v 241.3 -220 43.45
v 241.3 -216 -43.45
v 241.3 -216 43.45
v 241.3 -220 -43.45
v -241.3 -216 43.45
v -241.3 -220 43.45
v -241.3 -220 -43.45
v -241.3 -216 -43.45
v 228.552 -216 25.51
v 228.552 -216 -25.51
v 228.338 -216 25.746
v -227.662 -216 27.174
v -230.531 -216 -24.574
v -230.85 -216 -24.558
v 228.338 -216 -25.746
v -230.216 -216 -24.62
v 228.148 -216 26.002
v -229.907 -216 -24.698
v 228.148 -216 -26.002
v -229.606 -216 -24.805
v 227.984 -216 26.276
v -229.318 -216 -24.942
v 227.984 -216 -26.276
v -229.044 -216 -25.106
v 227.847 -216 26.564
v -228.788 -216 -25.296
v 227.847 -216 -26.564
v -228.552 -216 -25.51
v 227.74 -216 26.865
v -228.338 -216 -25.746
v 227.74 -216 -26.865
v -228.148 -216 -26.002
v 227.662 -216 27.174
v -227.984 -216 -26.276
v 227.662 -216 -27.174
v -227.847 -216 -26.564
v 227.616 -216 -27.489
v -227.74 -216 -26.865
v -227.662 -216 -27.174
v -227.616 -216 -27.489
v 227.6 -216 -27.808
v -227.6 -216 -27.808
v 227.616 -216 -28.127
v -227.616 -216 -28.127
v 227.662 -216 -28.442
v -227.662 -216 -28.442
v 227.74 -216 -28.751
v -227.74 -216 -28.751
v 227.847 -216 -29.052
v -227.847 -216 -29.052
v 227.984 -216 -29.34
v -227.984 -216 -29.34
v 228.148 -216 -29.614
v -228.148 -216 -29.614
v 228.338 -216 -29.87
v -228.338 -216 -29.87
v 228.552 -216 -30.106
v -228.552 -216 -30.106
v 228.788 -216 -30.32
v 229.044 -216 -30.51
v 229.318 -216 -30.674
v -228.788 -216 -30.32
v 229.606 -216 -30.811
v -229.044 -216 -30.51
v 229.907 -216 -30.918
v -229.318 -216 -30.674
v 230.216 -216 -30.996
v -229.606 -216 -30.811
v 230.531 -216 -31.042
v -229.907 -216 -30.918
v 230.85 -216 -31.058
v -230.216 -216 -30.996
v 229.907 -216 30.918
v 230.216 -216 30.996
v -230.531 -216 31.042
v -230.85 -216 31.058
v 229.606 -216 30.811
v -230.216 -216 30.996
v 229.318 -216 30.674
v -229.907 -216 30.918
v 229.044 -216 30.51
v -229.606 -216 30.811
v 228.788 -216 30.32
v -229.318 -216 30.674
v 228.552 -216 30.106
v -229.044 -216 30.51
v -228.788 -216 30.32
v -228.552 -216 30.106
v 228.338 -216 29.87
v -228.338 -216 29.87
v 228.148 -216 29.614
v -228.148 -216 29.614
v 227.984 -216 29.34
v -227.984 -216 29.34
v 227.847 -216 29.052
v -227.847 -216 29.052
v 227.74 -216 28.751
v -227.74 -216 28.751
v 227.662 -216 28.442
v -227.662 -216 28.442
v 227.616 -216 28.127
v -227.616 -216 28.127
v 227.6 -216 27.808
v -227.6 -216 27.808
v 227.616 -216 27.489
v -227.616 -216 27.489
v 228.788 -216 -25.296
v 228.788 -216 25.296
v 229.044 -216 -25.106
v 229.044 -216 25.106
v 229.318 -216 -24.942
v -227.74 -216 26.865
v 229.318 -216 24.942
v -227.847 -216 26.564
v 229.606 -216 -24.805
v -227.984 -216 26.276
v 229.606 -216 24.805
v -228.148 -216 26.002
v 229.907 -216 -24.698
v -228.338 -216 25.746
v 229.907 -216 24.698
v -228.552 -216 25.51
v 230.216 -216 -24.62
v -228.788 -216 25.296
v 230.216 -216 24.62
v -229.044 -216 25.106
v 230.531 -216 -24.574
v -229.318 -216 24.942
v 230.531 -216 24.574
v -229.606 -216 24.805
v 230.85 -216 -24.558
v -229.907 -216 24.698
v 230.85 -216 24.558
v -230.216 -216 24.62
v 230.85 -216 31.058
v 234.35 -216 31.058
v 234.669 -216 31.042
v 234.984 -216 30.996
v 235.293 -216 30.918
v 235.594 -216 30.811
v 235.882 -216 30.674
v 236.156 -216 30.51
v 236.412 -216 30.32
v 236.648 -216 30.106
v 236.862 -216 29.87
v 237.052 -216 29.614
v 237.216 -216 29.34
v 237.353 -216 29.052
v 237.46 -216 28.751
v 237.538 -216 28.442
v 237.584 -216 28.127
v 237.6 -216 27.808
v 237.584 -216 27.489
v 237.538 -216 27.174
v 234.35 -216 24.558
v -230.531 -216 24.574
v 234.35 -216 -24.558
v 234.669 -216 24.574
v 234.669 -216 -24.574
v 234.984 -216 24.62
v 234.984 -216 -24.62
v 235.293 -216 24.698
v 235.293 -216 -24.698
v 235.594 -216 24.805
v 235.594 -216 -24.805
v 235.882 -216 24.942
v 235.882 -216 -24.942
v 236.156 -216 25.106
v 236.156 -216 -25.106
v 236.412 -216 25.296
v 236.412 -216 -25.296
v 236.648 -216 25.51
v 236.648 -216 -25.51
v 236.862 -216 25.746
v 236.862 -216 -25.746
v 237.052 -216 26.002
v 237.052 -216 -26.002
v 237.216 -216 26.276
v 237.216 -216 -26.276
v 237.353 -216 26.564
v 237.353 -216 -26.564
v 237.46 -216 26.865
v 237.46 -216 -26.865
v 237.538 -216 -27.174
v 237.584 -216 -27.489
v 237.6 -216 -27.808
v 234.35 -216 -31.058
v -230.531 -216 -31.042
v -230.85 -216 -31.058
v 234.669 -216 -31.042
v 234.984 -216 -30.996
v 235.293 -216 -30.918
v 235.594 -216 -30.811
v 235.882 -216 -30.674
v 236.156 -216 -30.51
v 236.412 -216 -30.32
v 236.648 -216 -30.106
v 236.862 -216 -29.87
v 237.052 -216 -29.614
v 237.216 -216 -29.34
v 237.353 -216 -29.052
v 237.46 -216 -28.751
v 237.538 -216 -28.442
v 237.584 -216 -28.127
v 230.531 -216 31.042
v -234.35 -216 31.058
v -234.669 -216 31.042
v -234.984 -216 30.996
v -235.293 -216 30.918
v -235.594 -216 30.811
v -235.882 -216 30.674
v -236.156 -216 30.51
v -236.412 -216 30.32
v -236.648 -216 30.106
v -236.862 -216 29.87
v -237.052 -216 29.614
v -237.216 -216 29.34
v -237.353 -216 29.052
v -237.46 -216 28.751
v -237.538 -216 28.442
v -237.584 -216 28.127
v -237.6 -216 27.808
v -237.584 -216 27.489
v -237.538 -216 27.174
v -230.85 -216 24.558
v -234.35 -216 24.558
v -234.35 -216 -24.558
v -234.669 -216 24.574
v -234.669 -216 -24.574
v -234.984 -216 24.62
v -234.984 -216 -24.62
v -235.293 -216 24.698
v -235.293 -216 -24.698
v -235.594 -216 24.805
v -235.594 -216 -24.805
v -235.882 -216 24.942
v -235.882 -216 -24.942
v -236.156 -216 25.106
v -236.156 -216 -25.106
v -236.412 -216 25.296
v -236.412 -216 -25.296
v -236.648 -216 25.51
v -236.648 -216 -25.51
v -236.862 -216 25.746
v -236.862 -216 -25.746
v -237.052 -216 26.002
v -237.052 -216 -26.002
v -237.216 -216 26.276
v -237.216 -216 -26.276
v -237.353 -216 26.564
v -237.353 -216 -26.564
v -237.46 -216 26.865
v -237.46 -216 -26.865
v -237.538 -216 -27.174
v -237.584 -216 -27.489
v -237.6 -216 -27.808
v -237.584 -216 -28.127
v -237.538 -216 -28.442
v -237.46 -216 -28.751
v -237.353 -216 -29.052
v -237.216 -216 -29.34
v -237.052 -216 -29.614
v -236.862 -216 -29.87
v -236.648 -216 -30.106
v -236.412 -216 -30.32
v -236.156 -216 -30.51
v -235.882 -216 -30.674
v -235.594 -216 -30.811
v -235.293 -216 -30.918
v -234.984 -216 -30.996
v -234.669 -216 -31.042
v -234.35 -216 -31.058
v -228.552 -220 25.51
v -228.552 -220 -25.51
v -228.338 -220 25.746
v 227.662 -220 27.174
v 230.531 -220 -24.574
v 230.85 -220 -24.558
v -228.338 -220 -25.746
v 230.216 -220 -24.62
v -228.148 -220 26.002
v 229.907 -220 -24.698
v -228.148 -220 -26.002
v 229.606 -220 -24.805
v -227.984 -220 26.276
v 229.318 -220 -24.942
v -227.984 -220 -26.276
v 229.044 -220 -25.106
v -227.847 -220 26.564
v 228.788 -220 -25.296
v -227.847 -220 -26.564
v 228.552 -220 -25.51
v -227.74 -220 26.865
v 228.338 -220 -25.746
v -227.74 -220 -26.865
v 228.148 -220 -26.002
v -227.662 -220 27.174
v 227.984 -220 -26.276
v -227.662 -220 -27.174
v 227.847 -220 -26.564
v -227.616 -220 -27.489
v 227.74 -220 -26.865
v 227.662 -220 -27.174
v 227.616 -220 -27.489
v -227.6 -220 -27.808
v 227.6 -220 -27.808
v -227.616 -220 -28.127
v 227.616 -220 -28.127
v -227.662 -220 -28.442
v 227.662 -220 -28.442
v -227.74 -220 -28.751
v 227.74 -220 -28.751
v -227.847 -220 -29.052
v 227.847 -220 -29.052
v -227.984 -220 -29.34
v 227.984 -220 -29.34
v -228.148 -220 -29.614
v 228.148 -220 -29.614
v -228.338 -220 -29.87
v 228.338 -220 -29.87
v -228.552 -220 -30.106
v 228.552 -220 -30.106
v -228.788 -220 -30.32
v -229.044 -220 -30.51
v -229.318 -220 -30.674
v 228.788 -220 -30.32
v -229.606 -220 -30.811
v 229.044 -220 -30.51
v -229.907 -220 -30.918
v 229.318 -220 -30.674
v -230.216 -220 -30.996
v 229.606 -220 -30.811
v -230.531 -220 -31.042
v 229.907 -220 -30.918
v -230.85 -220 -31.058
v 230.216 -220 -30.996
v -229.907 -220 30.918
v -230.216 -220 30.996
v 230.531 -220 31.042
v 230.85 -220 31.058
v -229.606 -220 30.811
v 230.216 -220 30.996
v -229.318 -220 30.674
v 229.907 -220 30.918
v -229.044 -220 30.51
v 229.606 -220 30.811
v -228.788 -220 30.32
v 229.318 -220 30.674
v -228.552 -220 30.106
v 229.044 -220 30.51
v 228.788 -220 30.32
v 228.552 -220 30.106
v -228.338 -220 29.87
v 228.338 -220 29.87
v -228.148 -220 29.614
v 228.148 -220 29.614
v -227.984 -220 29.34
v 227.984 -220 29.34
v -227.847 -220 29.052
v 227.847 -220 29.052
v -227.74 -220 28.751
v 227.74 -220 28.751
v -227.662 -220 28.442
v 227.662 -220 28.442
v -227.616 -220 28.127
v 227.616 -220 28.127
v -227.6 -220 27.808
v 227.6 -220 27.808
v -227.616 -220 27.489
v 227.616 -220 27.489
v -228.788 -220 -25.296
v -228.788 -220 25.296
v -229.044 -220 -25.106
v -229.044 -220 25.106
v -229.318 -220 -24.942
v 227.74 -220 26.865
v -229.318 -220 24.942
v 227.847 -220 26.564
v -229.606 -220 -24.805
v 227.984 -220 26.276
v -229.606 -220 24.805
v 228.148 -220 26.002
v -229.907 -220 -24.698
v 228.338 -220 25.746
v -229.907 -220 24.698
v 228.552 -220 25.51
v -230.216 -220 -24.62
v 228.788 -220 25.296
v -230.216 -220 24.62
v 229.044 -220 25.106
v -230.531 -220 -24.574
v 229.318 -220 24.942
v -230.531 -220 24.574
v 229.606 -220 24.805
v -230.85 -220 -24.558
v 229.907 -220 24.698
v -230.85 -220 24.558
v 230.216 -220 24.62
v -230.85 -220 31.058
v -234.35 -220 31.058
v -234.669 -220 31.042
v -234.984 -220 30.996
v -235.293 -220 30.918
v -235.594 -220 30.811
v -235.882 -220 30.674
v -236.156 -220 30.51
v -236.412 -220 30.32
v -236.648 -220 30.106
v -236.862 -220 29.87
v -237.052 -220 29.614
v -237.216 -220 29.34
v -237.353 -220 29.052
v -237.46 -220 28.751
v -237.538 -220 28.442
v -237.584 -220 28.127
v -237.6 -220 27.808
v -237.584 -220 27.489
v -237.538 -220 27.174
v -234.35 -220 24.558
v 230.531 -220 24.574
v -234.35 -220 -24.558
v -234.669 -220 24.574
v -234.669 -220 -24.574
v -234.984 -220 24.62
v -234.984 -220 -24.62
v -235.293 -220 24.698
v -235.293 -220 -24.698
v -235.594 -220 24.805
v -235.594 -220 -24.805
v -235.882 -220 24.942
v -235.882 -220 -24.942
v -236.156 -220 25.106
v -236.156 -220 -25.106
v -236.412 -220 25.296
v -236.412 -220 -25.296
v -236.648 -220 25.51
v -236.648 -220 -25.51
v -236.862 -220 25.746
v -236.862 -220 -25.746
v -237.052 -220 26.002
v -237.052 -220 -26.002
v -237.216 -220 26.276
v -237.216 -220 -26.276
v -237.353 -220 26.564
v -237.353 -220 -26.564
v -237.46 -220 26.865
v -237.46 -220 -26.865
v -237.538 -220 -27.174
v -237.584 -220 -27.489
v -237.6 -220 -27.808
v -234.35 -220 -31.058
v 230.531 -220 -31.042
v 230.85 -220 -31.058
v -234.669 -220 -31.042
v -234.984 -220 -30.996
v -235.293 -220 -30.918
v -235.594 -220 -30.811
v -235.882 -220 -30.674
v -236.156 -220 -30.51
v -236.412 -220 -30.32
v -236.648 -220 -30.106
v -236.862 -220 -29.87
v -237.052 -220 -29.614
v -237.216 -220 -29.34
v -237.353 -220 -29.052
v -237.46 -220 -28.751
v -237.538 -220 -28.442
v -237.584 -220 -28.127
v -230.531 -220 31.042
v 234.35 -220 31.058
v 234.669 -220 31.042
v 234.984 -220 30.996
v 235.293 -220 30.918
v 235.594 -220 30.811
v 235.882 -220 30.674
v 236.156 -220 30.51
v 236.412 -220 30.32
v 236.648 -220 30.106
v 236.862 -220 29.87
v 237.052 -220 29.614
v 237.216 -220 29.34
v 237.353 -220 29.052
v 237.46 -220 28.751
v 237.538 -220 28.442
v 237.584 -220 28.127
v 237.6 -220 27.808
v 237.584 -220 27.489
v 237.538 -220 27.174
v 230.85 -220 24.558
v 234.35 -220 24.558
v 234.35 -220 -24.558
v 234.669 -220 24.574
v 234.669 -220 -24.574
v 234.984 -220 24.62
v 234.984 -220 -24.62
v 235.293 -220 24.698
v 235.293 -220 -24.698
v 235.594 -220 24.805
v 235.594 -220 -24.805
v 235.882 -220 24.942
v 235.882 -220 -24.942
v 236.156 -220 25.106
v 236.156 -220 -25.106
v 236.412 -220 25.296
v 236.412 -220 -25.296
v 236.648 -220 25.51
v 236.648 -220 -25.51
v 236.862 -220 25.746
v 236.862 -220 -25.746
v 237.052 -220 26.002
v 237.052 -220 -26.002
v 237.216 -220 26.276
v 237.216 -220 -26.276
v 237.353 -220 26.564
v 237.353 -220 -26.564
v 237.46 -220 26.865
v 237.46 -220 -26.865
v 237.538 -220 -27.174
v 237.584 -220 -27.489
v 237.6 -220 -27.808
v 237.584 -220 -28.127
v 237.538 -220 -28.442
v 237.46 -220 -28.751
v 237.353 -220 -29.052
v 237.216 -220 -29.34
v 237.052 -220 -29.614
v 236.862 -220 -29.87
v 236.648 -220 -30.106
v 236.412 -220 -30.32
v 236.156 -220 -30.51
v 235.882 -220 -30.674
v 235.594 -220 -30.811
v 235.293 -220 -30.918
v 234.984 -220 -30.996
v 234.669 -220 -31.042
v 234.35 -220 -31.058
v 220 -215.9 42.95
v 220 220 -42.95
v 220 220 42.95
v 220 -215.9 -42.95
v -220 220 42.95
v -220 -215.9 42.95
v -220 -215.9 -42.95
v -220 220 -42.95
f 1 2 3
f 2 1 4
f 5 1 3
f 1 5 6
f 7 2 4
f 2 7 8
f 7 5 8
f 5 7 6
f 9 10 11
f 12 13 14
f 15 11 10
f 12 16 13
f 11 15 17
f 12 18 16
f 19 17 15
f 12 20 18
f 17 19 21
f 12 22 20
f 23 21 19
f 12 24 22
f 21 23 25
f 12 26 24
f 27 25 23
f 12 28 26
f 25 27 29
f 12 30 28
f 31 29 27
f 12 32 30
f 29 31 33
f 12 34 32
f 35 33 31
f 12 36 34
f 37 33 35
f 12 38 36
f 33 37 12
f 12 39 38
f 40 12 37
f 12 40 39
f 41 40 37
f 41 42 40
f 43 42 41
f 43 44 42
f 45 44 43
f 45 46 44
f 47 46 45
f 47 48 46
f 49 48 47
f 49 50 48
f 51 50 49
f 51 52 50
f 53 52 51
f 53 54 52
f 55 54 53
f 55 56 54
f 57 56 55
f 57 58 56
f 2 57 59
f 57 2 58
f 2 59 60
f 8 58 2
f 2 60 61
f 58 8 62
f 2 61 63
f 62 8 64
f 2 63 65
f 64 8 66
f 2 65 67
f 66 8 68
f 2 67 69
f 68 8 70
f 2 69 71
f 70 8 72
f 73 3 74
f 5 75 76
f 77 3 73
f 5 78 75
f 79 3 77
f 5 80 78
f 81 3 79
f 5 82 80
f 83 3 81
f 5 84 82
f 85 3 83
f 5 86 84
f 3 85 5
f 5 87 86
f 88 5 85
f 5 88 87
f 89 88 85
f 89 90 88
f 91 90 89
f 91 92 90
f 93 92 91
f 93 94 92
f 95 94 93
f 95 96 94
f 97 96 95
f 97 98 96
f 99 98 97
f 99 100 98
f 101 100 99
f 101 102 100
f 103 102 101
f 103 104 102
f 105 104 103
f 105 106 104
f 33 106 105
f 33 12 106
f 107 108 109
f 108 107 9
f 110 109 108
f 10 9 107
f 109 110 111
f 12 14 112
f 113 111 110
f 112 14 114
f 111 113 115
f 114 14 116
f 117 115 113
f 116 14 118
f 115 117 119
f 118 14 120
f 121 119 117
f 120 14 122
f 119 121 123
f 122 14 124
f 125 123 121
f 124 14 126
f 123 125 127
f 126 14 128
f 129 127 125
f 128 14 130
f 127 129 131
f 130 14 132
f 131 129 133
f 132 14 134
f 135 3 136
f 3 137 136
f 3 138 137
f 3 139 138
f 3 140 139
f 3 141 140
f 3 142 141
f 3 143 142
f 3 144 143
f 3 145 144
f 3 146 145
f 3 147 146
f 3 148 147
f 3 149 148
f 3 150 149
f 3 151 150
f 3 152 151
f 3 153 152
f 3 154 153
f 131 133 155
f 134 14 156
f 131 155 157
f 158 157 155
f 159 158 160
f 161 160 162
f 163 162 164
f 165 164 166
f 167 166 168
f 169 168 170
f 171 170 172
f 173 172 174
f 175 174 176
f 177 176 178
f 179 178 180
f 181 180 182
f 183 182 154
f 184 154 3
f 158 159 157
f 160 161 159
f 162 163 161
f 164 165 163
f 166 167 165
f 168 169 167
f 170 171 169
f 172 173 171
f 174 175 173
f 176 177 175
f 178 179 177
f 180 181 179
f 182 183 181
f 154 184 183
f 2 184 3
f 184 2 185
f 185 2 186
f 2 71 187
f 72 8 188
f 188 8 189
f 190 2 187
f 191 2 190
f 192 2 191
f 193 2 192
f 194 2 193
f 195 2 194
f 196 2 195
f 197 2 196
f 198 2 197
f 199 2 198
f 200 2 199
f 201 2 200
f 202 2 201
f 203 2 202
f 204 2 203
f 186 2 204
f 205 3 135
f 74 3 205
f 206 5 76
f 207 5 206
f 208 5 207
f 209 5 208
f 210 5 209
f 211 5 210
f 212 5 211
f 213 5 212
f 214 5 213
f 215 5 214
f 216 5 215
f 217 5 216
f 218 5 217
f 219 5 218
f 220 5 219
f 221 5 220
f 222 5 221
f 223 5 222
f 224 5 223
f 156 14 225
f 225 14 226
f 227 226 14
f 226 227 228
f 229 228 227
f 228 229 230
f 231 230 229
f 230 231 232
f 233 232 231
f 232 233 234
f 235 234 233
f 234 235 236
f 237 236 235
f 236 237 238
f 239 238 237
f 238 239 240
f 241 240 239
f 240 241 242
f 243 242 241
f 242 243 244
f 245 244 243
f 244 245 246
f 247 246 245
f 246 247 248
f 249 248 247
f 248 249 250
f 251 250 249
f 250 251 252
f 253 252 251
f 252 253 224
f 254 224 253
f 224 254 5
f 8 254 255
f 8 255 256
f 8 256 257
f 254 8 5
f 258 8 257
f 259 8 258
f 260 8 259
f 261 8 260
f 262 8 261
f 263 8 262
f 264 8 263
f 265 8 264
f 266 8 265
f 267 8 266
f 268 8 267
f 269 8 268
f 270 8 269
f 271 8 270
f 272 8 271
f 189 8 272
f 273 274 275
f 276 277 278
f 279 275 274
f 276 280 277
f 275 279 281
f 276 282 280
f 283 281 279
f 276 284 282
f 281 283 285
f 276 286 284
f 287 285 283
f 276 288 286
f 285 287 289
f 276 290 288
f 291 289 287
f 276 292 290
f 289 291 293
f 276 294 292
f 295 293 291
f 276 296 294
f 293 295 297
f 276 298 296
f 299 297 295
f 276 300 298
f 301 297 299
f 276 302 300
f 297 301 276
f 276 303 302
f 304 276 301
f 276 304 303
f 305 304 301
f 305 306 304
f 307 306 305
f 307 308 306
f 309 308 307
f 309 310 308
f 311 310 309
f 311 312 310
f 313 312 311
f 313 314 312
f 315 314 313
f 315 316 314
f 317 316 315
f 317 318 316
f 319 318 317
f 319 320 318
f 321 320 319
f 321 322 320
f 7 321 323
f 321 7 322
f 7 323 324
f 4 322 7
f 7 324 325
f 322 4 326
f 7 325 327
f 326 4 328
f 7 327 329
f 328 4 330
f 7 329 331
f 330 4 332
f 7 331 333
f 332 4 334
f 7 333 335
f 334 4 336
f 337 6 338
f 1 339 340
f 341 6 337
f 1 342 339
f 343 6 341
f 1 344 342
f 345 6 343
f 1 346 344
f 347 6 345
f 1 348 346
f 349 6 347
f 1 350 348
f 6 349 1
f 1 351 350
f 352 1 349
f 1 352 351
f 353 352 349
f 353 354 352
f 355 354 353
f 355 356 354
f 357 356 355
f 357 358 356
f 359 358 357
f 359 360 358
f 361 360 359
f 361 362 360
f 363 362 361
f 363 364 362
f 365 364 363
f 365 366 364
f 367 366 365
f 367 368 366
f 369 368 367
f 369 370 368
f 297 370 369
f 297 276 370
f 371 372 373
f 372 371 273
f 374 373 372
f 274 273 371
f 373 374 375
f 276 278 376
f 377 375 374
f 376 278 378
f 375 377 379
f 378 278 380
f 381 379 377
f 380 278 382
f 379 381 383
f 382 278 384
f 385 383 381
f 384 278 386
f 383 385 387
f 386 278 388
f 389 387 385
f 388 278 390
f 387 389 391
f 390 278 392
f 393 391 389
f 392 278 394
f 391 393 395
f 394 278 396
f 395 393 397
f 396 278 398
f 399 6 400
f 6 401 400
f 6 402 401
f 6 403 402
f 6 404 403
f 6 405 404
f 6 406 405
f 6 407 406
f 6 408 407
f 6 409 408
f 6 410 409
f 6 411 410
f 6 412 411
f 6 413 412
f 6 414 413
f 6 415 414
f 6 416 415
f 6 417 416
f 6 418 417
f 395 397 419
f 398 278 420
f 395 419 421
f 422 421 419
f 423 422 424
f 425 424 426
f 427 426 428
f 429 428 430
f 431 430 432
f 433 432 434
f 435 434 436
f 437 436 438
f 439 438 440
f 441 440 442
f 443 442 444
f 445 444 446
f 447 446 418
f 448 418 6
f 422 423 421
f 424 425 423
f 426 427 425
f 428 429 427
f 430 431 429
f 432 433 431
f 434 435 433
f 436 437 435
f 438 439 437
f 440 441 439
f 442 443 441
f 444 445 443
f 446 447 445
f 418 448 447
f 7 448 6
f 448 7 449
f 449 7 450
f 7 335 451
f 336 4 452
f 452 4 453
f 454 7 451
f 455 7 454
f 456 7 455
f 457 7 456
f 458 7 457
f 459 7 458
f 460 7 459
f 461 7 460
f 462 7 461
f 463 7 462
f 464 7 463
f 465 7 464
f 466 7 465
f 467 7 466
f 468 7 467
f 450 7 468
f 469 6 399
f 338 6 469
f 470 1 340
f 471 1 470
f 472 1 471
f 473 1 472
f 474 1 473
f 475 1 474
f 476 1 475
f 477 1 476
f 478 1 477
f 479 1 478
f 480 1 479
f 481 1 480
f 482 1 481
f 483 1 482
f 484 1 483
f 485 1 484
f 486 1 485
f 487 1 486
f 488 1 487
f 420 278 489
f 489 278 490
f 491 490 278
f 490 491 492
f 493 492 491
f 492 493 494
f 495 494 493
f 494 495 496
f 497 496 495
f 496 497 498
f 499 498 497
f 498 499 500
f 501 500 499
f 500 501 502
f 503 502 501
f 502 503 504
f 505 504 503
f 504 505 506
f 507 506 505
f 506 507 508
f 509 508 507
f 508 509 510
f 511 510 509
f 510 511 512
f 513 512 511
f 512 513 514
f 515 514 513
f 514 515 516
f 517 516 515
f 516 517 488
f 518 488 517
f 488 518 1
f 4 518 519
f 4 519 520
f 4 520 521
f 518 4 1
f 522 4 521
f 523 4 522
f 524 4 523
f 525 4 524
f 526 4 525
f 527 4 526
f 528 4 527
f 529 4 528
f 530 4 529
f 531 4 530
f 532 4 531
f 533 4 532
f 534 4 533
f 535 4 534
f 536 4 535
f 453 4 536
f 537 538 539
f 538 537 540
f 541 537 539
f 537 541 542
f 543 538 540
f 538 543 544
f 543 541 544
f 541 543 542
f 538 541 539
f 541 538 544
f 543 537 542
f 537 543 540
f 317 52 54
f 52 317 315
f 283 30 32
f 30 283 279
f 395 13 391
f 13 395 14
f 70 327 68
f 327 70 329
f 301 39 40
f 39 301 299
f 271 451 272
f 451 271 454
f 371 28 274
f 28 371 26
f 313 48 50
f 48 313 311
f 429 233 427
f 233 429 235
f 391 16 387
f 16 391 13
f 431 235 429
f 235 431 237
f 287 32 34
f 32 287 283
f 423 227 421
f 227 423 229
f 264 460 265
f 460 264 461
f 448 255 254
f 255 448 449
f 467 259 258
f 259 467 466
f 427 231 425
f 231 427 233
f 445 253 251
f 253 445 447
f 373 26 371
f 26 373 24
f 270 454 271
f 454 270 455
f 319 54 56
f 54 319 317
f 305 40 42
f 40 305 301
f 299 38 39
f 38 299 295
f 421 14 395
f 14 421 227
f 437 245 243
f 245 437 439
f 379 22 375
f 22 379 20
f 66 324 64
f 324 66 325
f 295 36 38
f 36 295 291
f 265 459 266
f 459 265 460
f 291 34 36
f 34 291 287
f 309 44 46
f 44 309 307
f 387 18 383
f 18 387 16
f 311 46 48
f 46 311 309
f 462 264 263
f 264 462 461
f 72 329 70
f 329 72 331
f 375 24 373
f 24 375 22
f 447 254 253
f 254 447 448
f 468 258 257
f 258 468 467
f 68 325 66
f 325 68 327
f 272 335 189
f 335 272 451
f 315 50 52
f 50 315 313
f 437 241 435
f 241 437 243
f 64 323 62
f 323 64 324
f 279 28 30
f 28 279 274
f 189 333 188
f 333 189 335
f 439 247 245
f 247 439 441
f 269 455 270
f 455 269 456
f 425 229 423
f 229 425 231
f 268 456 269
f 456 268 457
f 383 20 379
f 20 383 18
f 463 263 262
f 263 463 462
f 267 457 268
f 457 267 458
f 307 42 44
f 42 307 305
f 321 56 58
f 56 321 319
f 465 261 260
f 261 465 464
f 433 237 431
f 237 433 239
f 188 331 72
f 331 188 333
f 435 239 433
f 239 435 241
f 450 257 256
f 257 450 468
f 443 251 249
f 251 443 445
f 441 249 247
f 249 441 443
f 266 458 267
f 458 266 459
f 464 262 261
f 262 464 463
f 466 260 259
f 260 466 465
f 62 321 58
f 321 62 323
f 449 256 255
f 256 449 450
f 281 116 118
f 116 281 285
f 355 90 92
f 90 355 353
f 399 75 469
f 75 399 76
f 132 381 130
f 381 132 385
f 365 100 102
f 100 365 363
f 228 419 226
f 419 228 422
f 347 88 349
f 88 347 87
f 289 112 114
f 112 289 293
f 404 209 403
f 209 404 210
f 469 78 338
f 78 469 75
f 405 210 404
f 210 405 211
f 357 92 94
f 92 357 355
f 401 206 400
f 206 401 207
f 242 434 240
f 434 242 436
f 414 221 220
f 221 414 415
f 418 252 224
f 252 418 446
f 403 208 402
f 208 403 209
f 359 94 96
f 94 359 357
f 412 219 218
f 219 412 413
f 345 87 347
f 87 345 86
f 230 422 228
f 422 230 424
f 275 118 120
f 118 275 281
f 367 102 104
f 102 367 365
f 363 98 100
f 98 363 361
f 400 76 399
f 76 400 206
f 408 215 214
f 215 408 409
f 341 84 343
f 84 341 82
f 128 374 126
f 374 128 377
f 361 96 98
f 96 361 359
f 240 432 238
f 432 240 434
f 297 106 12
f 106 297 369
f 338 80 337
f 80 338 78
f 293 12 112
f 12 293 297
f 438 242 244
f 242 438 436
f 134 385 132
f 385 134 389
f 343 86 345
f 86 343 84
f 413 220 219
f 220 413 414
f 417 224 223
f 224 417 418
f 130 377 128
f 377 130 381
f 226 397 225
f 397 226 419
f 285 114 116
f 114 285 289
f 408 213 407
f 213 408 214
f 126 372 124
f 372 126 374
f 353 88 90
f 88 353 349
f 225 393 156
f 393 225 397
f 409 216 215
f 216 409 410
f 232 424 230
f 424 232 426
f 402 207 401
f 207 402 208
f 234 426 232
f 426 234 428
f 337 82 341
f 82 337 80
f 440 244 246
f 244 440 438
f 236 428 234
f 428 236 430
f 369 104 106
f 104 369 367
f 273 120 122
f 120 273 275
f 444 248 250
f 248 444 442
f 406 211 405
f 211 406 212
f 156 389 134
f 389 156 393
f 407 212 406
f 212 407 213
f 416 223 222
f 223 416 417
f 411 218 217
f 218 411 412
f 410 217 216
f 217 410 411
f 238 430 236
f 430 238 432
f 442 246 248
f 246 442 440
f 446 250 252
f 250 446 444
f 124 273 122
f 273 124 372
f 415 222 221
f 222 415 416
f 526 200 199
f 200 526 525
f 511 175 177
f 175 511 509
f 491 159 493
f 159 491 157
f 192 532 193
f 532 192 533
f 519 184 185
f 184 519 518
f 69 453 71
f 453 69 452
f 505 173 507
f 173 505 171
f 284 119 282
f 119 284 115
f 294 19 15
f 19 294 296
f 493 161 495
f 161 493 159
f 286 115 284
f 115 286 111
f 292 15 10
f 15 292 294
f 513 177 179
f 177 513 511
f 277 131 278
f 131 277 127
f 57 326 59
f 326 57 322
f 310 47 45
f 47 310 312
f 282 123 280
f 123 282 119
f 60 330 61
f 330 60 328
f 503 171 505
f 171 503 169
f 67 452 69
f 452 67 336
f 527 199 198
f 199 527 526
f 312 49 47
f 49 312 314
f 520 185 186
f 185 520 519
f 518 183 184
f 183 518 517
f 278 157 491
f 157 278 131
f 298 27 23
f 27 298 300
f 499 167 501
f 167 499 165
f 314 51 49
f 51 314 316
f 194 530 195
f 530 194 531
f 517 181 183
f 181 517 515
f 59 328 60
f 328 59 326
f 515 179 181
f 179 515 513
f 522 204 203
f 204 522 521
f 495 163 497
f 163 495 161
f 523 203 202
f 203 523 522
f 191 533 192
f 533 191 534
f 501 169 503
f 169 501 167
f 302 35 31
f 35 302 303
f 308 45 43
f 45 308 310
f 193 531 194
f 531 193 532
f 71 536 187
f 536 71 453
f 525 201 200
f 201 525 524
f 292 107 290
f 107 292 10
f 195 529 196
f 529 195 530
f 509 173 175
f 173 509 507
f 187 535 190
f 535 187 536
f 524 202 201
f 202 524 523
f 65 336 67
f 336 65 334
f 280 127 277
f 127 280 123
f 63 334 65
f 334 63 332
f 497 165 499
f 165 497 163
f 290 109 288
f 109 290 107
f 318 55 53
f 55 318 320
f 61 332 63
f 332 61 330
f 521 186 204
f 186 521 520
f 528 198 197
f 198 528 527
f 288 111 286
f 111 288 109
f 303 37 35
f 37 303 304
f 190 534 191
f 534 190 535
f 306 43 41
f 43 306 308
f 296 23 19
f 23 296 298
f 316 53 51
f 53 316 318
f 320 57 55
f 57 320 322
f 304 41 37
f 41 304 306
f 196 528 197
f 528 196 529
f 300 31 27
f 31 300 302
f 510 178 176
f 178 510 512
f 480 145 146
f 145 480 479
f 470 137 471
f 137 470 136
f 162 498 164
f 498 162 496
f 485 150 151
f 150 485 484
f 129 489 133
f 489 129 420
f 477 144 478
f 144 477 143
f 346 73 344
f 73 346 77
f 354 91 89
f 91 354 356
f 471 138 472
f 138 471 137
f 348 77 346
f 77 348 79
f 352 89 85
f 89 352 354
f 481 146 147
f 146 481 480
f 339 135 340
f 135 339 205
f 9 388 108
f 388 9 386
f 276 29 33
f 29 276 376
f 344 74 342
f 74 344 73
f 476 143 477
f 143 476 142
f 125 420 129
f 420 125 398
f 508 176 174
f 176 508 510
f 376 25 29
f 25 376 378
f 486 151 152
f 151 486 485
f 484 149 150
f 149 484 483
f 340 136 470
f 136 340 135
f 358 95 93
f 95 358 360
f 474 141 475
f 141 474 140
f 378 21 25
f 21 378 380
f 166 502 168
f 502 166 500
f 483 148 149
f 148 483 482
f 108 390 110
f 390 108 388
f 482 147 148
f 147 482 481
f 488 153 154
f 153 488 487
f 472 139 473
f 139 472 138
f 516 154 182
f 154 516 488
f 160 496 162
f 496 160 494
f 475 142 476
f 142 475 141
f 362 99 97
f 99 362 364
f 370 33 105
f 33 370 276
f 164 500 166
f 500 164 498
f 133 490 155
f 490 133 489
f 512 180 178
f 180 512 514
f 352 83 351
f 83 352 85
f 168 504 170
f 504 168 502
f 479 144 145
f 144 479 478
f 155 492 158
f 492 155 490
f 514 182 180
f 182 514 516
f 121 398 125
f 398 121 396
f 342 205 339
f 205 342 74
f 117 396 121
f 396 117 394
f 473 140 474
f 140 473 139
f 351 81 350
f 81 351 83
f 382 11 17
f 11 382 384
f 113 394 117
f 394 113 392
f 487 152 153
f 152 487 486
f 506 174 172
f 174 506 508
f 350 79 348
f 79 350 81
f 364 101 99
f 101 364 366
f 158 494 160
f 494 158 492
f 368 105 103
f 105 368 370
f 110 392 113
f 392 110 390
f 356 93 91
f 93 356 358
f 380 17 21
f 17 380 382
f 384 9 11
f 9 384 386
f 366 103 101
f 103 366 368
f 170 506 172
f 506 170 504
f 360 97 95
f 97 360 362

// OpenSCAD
// ============================================================================
// Atom Lithography Machine — Parametric OpenSCAD Module (S6.10-04)
// ============================================================================
// part_id           : S6.10-04
// parent_bom_id     : S6.10
// subsystem         : S6
// part_name         : M4 dusuk-gurultulu 20-bit DC dipol kapi DAC & filtre elektronigi [v5.0 NET: 5 GHz RF S6.11-01'e tasindi]
// material          : Al 6061
// temp_stage        : 300 K (kabin)
// vacuum_grade      : Atmosfer
// tolerance         : <0.5 uV/sqrt(Hz)
// computed_mass_kg  : 5.74417
// envelope_mm       : 482.600 x 452.050 x 86.900
// design_maturity   : M0_M1_DETAILED_CAD_DESIGN_ONLY
// no_lab_measurement: true
// iec61508_certified: false
// semi_s2_certified : false
// Units: millimeters (mm)
// ============================================================================

$fn = 64;

// Nominal bounding envelope parameters (mm)
bbox_x = 482.6000;
bbox_y = 452.0500;
bbox_z = 86.9000;

// Part-specific parametric dimensions
rack_u = 2;
u_start = 7;
dac_bits = 20;
noise_uv_rthz = 0.5;

// Interface / port parameters (mm)

module part_S6_10_04() {
  difference() {
    union() {
      // 19" EIA-310 front bezel panel
      translate([0.000, -218.000, 0.000]) cube([482.600, 4.000, 86.900], center=true);
      // Hollow EMI shielded chassis body
      translate([0.000, 2.050, 0.000]) cube([440.000, 435.900, 85.900], center=true);
    }
    // EIA-310 rack ear slot
    translate([-232.600, -218.000, -27.808]) rotate([90.000, 0.000, 0.000]) {
      hull() {
        translate([-1.750, 0, 0]) cylinder(d=6.500, h=6.000, center=true);
        translate([1.750, 0, 0]) cylinder(d=6.500, h=6.000, center=true);
      }
    }
    // EIA-310 rack ear slot
    translate([-232.600, -218.000, 27.808]) rotate([90.000, 0.000, 0.000]) {
      hull() {
        translate([-1.750, 0, 0]) cylinder(d=6.500, h=6.000, center=true);
        translate([1.750, 0, 0]) cylinder(d=6.500, h=6.000, center=true);
      }
    }
    // EIA-310 rack ear slot
    translate([232.600, -218.000, -27.808]) rotate([90.000, 0.000, 0.000]) {
      hull() {
        translate([-1.750, 0, 0]) cylinder(d=6.500, h=6.000, center=true);
        translate([1.750, 0, 0]) cylinder(d=6.500, h=6.000, center=true);
      }
    }
    // EIA-310 rack ear slot
    translate([232.600, -218.000, 27.808]) rotate([90.000, 0.000, 0.000]) {
      hull() {
        translate([-1.750, 0, 0]) cylinder(d=6.500, h=6.000, center=true);
        translate([1.750, 0, 0]) cylinder(d=6.500, h=6.000, center=true);
      }
    }
  }
}

// World assembly mounting transform (global machine frame, mm / deg):
// translate([2100.000, 0.000, 401.150]) rotate([0.000, 0.000, 0.000]) part_S6_10_04();

part_S6_10_04();
